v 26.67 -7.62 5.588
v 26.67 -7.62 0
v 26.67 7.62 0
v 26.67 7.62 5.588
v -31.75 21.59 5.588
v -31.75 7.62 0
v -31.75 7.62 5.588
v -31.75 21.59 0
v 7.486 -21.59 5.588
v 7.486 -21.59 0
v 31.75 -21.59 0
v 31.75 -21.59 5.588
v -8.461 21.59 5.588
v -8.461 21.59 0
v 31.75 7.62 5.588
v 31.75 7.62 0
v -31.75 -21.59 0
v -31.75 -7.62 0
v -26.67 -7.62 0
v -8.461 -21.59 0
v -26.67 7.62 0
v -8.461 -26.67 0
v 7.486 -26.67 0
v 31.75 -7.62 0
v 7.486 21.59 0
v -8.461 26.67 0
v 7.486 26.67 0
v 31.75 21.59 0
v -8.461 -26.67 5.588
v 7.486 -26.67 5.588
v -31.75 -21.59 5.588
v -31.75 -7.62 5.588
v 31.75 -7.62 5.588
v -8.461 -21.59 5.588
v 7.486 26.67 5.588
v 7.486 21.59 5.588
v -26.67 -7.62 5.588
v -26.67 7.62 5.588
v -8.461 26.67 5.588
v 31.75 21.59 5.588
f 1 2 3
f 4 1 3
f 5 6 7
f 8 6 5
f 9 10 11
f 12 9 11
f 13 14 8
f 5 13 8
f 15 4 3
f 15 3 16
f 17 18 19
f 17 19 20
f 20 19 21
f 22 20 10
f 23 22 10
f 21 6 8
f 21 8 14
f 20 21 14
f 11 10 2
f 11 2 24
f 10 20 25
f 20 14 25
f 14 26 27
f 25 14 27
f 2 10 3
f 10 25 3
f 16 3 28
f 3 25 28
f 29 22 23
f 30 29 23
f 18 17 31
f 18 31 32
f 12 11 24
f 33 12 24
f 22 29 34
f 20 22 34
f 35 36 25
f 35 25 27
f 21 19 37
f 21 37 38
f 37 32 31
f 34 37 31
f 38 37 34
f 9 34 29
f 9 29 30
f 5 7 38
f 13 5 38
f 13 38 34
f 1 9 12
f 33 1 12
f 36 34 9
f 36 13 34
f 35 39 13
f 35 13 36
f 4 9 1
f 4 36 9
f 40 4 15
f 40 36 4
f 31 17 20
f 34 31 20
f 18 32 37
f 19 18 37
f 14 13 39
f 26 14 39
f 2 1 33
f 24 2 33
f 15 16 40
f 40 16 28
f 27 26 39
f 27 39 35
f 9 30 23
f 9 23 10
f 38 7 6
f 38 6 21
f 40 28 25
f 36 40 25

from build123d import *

# Parameters (mm, degrees)
SKETCH1_W           = 5.08
SKETCH1_H           = 13.97
SKETCH1_W_2         = 53.34
SKETCH1_H_2         = 43.18
SKETCH1_W_3         = 15.946260678
SKETCH1_H_3         = 5.08
BOSS_EXTRUDE1_DEPTH = 5.588


with BuildPart() as part:
    # Sketch1 → Boss-Extrude1 (new body)
    with BuildSketch(Plane.XY):
        with Locations((-29.21, 14.605)):
            Rectangle(SKETCH1_W, SKETCH1_H)
        Rectangle(SKETCH1_W_2, SKETCH1_H_2)
        with Locations((-0.487430597, 24.13)):
            Rectangle(SKETCH1_W_3, SKETCH1_H_3)
        with Locations((29.21, 14.605)):
            Rectangle(SKETCH1_W, SKETCH1_H)
        with Locations((-0.487430597, -24.13)):
            Rectangle(SKETCH1_W_3, SKETCH1_H_3)
        with Locations((-29.21, -14.605)):
            Rectangle(SKETCH1_W, SKETCH1_H)
        with Locations((29.21, -14.605)):
            Rectangle(SKETCH1_W, SKETCH1_H)
    extrude(amount=BOSS_EXTRUDE1_DEPTH)


solid = part.part
